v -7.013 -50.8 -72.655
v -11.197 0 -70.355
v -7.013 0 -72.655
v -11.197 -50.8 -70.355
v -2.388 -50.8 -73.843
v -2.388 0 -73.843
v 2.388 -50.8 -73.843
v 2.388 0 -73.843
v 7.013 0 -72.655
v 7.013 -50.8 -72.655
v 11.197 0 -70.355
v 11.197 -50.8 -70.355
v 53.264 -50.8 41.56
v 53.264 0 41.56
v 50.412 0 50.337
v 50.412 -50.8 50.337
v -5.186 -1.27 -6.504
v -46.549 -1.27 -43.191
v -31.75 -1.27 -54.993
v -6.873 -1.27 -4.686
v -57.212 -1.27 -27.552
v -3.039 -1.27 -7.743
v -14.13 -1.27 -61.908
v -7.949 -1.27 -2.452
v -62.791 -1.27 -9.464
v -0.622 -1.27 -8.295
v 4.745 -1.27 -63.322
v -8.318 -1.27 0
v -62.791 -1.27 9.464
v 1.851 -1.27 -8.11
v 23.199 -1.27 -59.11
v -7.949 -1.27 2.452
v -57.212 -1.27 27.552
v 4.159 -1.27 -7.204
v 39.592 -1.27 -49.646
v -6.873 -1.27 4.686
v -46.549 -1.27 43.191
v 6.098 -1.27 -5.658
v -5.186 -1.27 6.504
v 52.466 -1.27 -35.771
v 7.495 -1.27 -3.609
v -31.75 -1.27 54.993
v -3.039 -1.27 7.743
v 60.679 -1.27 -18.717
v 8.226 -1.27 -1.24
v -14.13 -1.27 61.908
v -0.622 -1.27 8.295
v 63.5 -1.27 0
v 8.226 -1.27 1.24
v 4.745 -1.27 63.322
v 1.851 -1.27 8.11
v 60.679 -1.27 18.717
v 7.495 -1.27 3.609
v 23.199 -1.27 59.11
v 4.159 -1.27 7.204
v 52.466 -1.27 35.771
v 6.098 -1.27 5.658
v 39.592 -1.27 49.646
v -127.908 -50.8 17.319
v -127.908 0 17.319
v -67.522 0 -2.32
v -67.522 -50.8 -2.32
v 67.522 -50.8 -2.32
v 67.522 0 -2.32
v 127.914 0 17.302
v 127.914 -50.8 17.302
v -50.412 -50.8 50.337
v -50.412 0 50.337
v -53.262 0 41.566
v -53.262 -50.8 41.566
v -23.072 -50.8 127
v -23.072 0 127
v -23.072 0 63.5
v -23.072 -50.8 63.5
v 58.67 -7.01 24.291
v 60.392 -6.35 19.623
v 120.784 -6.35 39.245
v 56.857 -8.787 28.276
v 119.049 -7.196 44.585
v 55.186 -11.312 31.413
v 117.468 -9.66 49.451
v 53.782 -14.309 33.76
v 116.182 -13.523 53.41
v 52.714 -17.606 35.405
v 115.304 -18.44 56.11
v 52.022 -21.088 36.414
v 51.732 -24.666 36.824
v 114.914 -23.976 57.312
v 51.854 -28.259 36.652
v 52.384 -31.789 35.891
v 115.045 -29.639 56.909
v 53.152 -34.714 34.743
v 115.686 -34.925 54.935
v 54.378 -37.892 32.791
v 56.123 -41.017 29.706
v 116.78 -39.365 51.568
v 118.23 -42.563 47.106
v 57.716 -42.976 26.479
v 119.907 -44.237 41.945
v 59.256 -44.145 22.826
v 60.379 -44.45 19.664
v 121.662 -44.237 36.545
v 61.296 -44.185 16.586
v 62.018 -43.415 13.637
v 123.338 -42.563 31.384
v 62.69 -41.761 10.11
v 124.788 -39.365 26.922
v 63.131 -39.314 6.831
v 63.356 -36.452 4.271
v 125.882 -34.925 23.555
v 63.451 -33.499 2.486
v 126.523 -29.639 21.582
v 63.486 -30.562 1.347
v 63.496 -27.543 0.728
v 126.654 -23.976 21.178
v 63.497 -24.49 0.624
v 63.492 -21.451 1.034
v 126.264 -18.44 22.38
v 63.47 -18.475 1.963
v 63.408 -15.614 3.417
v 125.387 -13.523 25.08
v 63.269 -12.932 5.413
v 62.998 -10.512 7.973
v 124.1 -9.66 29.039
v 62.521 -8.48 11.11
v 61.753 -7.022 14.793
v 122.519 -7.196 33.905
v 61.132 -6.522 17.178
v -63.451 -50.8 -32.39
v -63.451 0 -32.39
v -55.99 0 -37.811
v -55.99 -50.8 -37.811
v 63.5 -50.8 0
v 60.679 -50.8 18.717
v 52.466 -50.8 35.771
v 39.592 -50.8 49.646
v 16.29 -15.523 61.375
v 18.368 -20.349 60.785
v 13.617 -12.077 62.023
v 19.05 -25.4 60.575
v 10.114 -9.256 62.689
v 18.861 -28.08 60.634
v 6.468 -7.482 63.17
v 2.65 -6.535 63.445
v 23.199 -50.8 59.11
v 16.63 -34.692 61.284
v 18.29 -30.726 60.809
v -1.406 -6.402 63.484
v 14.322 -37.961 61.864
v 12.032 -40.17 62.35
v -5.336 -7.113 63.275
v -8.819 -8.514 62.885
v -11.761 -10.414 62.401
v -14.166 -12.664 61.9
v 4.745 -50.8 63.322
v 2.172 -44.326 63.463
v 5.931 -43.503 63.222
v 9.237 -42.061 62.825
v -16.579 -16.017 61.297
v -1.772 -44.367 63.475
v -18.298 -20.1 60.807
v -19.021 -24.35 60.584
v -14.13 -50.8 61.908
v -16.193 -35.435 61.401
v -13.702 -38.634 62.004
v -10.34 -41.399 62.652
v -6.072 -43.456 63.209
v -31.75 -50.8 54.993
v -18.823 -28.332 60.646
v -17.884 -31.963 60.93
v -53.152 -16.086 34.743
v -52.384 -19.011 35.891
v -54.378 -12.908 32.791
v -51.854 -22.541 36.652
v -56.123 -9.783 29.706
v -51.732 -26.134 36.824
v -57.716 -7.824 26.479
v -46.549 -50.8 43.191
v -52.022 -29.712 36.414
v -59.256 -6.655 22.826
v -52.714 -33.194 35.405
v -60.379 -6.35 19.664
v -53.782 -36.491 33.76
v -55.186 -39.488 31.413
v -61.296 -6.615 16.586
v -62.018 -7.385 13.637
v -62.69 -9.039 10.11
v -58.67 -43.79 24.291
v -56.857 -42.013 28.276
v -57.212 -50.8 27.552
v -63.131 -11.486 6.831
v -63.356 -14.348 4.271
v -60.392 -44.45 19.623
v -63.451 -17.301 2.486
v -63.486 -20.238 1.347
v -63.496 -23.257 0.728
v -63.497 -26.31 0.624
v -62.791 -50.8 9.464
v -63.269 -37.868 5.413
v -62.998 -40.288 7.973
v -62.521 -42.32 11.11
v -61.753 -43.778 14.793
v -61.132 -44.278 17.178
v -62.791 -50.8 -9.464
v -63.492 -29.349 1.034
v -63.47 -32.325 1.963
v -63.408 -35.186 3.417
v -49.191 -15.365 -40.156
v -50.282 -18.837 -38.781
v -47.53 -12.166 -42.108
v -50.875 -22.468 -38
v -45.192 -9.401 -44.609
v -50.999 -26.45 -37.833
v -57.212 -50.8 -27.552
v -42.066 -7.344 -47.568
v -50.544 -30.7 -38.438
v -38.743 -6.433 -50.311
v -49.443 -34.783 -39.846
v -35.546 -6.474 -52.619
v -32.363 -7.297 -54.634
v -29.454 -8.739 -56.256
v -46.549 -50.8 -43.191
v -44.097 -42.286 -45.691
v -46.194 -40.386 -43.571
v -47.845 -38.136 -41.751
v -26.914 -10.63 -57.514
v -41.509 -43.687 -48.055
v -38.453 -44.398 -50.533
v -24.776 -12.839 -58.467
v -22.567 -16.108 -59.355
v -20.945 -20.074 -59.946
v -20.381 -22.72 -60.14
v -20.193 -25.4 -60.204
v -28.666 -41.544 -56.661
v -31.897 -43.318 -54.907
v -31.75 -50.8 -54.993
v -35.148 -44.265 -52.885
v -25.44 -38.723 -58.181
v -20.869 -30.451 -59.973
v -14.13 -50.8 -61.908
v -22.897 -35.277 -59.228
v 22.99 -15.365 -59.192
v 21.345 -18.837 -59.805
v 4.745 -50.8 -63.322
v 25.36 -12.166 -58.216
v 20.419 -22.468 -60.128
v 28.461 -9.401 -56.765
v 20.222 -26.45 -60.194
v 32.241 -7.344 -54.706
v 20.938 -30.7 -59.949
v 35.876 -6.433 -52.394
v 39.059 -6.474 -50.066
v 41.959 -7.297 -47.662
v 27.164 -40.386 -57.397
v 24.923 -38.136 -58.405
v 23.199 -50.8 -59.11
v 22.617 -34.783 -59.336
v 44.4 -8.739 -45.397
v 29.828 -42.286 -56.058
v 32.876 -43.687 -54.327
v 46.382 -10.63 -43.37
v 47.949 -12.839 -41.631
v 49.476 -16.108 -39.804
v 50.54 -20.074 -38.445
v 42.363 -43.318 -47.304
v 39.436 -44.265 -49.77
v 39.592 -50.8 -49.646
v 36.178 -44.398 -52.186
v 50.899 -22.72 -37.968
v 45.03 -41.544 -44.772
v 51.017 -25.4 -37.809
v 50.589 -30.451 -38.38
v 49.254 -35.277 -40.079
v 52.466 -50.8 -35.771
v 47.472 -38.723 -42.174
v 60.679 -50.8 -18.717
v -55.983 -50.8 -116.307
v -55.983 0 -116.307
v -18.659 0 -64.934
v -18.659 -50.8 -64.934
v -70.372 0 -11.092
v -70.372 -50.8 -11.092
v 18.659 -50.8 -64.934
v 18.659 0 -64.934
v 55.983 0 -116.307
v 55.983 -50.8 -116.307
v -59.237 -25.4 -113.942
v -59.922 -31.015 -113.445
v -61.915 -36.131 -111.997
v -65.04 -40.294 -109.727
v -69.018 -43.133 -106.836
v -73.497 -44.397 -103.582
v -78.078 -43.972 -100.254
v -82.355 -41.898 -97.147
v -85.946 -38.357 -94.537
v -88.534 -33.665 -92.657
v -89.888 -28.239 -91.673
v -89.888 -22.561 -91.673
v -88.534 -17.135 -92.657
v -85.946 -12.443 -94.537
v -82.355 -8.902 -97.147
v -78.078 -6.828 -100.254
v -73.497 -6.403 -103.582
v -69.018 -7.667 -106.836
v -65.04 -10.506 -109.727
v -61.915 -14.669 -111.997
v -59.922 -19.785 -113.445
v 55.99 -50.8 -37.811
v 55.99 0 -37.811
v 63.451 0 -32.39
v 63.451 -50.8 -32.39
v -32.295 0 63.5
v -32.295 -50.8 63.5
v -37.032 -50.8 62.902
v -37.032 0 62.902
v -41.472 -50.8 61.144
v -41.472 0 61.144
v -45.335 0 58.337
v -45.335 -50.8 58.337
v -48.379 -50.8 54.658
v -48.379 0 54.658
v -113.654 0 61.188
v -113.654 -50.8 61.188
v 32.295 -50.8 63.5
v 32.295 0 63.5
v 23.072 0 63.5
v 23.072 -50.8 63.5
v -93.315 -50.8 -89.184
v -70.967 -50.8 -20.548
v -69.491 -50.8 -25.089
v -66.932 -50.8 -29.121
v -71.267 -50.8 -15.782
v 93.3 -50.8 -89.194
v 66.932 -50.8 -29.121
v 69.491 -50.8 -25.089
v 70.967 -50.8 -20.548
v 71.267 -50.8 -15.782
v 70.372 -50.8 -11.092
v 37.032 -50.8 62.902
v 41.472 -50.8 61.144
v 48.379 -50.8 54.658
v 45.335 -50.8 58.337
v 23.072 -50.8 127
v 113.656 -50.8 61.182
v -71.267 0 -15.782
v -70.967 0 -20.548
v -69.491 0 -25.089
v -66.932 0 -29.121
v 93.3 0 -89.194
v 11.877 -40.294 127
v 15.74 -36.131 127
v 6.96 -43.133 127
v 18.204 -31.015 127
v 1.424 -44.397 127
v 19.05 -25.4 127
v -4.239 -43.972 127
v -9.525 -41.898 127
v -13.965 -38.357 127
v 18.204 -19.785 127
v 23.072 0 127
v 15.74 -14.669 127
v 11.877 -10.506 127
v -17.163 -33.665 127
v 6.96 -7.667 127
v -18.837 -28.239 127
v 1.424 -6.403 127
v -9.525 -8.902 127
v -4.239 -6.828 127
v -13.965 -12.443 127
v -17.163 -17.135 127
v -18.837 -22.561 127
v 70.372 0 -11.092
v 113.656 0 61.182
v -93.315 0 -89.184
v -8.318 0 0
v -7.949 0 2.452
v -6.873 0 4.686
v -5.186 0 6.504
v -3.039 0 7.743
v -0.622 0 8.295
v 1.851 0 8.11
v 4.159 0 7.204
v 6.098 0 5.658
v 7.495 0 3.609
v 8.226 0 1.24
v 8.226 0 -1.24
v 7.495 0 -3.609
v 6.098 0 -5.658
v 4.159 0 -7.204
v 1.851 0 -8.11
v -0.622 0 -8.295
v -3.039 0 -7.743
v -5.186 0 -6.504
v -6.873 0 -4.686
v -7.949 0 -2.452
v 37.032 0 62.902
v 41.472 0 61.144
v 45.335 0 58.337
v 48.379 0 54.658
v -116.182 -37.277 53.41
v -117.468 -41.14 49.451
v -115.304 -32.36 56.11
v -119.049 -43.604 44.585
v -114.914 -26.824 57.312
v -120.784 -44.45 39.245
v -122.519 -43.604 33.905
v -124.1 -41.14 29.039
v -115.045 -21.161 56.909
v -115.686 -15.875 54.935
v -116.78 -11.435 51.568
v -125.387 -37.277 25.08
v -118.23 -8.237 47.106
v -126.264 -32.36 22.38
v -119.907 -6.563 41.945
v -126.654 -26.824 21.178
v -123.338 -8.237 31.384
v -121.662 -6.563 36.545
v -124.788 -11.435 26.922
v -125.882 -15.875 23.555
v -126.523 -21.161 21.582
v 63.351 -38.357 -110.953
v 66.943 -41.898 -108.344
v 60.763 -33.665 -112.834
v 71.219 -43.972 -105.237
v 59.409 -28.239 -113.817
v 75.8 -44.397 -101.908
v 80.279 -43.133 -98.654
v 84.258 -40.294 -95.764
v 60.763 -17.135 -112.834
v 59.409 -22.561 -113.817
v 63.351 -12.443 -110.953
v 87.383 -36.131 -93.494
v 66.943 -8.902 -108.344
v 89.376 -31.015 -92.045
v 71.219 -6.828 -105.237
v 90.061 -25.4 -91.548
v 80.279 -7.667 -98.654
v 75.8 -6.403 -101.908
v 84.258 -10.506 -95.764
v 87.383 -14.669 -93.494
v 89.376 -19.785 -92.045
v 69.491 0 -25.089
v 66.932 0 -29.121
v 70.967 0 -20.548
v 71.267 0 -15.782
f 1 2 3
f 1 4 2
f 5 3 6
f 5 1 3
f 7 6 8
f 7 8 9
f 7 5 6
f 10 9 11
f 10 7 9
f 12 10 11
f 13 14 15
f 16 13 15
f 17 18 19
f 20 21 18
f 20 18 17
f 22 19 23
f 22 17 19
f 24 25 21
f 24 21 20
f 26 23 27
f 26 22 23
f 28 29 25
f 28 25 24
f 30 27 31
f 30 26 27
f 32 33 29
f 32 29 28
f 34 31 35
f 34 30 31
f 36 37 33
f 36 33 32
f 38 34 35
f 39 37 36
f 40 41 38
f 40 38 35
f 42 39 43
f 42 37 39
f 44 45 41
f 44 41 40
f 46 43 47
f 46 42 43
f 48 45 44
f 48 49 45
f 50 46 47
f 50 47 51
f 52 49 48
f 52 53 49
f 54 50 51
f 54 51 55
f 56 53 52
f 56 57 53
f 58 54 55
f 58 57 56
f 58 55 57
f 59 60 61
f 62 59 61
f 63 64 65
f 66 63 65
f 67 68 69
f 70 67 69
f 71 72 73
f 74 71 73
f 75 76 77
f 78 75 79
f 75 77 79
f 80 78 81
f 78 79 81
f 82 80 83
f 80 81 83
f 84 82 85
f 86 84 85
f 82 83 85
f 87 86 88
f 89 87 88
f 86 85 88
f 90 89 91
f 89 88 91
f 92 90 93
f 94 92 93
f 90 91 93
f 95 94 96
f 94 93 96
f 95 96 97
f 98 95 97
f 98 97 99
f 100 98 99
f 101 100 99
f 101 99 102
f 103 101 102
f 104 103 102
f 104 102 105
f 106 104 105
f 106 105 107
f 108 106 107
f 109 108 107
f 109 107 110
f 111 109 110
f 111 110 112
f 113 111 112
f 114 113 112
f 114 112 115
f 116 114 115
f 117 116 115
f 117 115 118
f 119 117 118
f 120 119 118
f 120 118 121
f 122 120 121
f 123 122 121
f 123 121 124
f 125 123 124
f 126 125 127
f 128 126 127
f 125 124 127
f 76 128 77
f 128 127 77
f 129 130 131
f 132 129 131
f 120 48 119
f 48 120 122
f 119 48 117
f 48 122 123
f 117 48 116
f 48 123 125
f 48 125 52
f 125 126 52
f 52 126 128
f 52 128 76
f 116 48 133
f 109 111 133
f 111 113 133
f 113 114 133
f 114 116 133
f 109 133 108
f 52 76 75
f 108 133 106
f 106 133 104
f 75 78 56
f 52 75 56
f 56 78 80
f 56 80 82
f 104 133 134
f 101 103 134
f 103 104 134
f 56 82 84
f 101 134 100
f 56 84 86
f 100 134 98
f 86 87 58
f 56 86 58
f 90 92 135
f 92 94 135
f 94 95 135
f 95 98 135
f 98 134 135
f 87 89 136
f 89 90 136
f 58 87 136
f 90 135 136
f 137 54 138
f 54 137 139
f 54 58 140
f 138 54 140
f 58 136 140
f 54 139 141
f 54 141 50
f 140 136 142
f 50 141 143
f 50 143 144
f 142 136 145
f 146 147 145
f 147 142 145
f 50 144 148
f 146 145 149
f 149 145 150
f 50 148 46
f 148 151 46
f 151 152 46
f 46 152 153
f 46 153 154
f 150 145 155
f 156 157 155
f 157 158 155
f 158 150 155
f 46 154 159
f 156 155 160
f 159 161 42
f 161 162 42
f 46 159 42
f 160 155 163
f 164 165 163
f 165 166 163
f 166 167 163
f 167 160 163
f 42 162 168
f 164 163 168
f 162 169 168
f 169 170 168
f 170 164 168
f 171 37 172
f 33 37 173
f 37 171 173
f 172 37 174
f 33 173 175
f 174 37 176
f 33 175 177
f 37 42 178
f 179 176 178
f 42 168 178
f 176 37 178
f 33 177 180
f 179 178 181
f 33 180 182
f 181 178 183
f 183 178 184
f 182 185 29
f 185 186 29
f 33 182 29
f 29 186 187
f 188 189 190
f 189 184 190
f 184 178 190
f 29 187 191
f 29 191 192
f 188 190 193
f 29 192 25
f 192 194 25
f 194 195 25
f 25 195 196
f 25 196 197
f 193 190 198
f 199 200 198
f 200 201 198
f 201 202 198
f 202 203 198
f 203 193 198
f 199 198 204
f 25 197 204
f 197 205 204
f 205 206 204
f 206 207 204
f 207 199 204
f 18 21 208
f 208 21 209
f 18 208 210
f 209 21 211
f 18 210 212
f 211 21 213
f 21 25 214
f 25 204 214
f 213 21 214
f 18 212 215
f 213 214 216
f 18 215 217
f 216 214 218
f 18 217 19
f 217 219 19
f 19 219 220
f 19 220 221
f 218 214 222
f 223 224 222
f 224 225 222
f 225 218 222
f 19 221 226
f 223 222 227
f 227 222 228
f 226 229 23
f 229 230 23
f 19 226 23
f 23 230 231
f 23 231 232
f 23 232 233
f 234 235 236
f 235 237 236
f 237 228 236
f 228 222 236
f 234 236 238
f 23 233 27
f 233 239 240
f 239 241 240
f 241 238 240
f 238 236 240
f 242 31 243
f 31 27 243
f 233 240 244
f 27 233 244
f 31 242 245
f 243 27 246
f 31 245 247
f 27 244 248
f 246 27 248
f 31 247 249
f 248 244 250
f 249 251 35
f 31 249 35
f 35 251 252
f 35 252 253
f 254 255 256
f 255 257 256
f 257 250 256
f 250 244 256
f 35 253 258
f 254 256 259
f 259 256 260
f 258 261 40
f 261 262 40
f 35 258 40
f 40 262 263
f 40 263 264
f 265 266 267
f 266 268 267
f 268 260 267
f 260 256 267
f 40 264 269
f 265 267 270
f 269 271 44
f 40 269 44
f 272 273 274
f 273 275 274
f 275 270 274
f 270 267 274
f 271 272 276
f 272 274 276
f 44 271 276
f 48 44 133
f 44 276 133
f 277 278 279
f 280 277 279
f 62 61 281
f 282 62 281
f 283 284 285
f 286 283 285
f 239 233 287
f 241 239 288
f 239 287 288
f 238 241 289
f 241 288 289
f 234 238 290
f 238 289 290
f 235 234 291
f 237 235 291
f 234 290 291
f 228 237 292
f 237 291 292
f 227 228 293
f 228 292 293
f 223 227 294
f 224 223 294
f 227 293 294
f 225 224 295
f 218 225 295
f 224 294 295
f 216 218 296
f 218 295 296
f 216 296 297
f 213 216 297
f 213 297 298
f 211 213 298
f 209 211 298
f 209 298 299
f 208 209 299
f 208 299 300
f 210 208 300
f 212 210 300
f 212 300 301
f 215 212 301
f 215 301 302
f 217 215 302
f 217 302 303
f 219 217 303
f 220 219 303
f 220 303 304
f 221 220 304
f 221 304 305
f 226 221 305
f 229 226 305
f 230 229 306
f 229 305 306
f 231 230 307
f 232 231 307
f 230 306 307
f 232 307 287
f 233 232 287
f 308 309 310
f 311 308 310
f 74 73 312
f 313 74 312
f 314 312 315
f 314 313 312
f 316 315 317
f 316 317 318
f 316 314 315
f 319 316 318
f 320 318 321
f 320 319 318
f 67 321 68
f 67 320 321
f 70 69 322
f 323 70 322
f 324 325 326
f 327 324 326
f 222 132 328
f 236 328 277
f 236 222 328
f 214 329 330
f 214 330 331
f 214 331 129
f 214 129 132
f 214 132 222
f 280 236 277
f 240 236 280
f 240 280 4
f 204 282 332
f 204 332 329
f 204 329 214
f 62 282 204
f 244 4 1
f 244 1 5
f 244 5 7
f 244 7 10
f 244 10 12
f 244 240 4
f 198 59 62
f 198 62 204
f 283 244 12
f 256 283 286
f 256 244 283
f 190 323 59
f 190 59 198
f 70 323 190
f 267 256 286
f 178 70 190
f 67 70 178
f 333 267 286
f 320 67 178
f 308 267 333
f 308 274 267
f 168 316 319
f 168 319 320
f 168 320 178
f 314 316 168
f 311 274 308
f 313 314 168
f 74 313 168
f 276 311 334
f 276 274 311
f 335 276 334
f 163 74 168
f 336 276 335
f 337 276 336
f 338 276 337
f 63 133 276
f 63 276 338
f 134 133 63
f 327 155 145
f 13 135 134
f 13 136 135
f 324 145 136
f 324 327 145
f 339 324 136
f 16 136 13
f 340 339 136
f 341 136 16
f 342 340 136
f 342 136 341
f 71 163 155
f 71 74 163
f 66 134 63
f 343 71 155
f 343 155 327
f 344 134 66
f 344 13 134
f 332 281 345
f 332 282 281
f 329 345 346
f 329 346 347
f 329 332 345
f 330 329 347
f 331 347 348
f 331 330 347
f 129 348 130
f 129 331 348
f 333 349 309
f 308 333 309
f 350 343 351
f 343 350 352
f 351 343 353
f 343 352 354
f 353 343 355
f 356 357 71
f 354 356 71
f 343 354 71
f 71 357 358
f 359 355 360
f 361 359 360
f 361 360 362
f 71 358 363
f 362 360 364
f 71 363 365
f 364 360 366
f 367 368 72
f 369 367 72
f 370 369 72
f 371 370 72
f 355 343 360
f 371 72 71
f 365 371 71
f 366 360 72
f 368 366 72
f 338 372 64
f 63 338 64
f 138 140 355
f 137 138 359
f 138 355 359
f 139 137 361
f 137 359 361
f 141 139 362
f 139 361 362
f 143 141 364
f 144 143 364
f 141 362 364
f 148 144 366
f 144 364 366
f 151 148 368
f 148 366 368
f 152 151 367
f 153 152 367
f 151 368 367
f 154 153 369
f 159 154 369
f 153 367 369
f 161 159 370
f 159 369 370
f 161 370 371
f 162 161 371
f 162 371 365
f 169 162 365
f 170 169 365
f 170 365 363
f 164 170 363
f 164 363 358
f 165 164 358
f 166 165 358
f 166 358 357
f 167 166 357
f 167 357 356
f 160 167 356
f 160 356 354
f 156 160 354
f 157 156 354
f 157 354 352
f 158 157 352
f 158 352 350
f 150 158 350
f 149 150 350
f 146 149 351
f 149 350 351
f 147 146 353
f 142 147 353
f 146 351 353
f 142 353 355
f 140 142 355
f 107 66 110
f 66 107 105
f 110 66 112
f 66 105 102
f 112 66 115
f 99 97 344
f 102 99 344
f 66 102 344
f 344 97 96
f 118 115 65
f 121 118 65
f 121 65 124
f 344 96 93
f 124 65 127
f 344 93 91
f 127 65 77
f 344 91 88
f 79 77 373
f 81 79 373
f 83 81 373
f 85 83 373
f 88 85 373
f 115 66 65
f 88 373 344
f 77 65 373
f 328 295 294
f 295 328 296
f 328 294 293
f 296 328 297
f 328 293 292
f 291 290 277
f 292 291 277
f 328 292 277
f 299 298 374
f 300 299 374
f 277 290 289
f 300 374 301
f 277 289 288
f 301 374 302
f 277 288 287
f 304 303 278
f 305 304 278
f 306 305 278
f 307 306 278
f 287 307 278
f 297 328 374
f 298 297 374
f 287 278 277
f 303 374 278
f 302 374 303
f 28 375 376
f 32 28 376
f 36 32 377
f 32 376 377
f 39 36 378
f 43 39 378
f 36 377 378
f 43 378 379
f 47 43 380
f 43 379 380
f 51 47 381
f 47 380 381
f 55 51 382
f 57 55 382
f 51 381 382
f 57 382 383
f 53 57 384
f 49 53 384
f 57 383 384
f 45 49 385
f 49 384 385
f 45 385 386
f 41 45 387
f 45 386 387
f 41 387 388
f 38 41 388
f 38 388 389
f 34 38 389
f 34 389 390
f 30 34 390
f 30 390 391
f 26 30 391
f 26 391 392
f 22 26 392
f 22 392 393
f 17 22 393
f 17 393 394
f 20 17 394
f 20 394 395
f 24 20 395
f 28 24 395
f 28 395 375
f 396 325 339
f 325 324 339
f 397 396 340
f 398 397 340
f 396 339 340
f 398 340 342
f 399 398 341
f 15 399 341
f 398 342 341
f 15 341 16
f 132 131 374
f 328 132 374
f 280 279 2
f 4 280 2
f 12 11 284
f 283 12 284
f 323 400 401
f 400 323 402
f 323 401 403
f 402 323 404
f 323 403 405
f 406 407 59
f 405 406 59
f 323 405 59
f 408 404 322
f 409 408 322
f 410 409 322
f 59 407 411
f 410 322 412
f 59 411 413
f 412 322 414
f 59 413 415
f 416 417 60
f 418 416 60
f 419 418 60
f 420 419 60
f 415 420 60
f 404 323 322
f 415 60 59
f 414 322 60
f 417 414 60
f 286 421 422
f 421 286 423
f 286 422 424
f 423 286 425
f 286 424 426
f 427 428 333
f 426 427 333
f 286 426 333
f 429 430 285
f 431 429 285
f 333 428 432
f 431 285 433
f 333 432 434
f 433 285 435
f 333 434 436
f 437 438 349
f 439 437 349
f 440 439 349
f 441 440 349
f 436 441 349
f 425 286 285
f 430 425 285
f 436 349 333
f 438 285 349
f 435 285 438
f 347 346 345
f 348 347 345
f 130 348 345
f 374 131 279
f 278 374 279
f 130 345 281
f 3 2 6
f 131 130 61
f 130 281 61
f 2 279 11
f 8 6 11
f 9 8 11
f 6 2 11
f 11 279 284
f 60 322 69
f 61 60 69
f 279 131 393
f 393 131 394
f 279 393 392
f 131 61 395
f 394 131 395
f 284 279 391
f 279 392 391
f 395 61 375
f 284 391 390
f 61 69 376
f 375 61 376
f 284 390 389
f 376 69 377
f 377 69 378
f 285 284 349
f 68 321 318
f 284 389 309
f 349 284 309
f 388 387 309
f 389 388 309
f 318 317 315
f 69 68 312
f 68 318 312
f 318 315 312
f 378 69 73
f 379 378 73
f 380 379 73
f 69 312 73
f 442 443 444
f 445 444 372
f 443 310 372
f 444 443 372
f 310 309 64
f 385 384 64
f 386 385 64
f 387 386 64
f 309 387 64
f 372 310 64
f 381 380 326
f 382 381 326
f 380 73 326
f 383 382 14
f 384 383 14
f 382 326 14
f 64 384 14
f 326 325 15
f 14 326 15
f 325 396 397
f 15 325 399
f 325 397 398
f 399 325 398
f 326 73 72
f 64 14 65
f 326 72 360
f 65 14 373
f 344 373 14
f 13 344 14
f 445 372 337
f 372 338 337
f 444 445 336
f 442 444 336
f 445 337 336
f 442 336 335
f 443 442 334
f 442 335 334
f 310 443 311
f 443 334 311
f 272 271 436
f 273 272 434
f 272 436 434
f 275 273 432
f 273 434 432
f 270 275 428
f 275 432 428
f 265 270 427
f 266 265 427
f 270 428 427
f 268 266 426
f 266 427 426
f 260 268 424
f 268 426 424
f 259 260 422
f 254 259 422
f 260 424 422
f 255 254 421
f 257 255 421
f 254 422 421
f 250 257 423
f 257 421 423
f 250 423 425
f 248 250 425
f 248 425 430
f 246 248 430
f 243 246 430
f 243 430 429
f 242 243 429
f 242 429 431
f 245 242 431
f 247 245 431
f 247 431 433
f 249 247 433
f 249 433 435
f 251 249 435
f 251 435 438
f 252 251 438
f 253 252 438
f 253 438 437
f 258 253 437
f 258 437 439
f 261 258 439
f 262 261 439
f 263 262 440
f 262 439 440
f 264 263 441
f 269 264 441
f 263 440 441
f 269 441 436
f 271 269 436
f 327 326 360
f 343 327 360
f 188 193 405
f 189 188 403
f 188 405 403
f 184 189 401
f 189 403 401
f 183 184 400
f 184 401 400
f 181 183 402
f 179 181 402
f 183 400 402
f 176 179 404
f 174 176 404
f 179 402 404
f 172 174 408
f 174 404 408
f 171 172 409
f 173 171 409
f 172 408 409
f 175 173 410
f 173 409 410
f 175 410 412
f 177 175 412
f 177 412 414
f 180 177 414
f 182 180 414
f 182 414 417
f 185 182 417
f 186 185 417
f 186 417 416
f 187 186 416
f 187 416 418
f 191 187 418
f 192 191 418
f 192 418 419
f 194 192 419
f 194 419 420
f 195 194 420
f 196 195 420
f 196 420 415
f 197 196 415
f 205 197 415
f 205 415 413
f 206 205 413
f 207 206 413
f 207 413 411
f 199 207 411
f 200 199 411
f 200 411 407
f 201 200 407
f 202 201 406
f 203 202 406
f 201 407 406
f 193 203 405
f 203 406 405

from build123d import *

# Parameters (mm, degrees)
F1_DEPTH  = 50.8
F2_R      = 63.5
F3_DEPTH  = 49.53
F4_R      = 8.3185
F5_DEPTH  = 25.4
F9_R      = 19.05
F11_DEPTH = 76.2
F10_R     = 19.05
F12_DEPTH = 76.2
F6_R      = 19.05
F13_DEPTH = 76.2
F7_R      = 19.05
F14_DEPTH = 76.2
F8_R      = 19.05
F15_DEPTH = 76.2
F16_R     = 19.05


# Not quite as in the source:
# - a feature names something its author has since deleted; it is built from what else it names


with BuildPart() as f1:
    # F0 (on Front) → F1 (new body)
    with BuildSketch(Plane.XZ):
        Polygon((-23.0722505283, 63.5), (-46.1354505283, 63.5), (-53.262371273, 41.5655933534), (-113.6544600578, 61.1881724962), (-127.9083015471, 17.319359203), (-67.5218062965, -2.3204350678), (-74.6487270411, -24.2548417144), (-55.9902062965, -37.8110505451), (-93.314569817, -89.1836296879), (-55.9828842652, -116.3066868834), (-18.6585207447, -64.9341077406), (0, -78.4903165712), (18.6585207447, -64.9341077406), (55.9828842652, -116.3066868834), (93.2999257546, -89.194269222), (55.9902062965, -37.8110505451), (74.6487270411, -24.2548417144), (67.5218062965, -2.3204350678), (127.9138950812, 17.302144075), (113.6564223157, 61.1821332873), (53.2643335309, 41.5595541445), (46.1354505283, 63.5), (23.0722505283, 63.5), (23.0722505283, 127), (-23.0722505283, 127), align=None)
    extrude(amount=F1_DEPTH)

    # F2 (on face) → F3 (cut)
    with BuildSketch(Plane.XZ.offset(50.8)):
        Circle(F2_R)
    extrude(amount=-F3_DEPTH, mode=Mode.SUBTRACT)

    # F4 (on face) → F5 (cut)
    with BuildSketch(Plane(origin=(0, 0, 0), x_dir=(-1, 0, 0), z_dir=(0, 1, 0))):
        Circle(F4_R)
    extrude(amount=-F5_DEPTH, mode=Mode.SUBTRACT)

    # F9 (on face) → F11 (cut)
    with BuildSketch(Plane(origin=(-74.6487270411, 0, -102.7451582856), x_dir=(0.8090169944, 0, -0.5877852523), z_dir=(-0.5877852523, 0, -0.8090169944))):
        with Locations((0, 25.4)):
            Circle(F9_R)
    extrude(amount=-F11_DEPTH, mode=Mode.SUBTRACT)

    # F10 (on face) → F12 (cut)
    with BuildSketch(Plane(origin=(-120.7841775695, 0, 39.2451582856), x_dir=(0, -1, 0), z_dir=(-0.9510565163, 0, 0.3090169944))):
        with Locations((25.4, 0)):
            Circle(F10_R)
    extrude(amount=-F12_DEPTH, mode=Mode.SUBTRACT)

    # F6 (on face) → F13 (cut)
    with BuildSketch(Plane.XY.offset(127)):
        with Locations((0, -25.4)):
            Circle(F6_R)
    extrude(amount=-F13_DEPTH, mode=Mode.SUBTRACT)

    # F7 (on face) → F14 (cut)
    with BuildSketch(Plane(origin=(120.7841775695, 0, 39.2451582856), x_dir=(0, 1, 0), z_dir=(0.9510565163, 0, 0.3090169944))):
        with Locations((-25.4, 0)):
            Circle(F7_R)
    extrude(amount=-F14_DEPTH, mode=Mode.SUBTRACT)

    # F8 (on face) → F15 (cut)
    with BuildSketch(Plane(origin=(74.6487270411, 0, -102.7451582856), x_dir=(0.8090169944, 0, 0.5877852523), z_dir=(0.5877852523, 0, -0.8090169944))):
        with Locations((0, 25.4)):
            Circle(F8_R)
    extrude(amount=-F15_DEPTH, mode=Mode.SUBTRACT)

    # F16
    f16_edges = [f1.edges().sort_by_distance(p)[0] for p in [
        (0, -25.4, -78.490317),
        (74.648727, -25.4, -24.254842),
        (-74.648727, -25.4, -24.254842),
        (-46.135451, -25.4, 63.5),
        (46.135451, -25.4, 63.5),
    ]]
    fillet(f16_edges, radius=F16_R)


solid = f1.part
